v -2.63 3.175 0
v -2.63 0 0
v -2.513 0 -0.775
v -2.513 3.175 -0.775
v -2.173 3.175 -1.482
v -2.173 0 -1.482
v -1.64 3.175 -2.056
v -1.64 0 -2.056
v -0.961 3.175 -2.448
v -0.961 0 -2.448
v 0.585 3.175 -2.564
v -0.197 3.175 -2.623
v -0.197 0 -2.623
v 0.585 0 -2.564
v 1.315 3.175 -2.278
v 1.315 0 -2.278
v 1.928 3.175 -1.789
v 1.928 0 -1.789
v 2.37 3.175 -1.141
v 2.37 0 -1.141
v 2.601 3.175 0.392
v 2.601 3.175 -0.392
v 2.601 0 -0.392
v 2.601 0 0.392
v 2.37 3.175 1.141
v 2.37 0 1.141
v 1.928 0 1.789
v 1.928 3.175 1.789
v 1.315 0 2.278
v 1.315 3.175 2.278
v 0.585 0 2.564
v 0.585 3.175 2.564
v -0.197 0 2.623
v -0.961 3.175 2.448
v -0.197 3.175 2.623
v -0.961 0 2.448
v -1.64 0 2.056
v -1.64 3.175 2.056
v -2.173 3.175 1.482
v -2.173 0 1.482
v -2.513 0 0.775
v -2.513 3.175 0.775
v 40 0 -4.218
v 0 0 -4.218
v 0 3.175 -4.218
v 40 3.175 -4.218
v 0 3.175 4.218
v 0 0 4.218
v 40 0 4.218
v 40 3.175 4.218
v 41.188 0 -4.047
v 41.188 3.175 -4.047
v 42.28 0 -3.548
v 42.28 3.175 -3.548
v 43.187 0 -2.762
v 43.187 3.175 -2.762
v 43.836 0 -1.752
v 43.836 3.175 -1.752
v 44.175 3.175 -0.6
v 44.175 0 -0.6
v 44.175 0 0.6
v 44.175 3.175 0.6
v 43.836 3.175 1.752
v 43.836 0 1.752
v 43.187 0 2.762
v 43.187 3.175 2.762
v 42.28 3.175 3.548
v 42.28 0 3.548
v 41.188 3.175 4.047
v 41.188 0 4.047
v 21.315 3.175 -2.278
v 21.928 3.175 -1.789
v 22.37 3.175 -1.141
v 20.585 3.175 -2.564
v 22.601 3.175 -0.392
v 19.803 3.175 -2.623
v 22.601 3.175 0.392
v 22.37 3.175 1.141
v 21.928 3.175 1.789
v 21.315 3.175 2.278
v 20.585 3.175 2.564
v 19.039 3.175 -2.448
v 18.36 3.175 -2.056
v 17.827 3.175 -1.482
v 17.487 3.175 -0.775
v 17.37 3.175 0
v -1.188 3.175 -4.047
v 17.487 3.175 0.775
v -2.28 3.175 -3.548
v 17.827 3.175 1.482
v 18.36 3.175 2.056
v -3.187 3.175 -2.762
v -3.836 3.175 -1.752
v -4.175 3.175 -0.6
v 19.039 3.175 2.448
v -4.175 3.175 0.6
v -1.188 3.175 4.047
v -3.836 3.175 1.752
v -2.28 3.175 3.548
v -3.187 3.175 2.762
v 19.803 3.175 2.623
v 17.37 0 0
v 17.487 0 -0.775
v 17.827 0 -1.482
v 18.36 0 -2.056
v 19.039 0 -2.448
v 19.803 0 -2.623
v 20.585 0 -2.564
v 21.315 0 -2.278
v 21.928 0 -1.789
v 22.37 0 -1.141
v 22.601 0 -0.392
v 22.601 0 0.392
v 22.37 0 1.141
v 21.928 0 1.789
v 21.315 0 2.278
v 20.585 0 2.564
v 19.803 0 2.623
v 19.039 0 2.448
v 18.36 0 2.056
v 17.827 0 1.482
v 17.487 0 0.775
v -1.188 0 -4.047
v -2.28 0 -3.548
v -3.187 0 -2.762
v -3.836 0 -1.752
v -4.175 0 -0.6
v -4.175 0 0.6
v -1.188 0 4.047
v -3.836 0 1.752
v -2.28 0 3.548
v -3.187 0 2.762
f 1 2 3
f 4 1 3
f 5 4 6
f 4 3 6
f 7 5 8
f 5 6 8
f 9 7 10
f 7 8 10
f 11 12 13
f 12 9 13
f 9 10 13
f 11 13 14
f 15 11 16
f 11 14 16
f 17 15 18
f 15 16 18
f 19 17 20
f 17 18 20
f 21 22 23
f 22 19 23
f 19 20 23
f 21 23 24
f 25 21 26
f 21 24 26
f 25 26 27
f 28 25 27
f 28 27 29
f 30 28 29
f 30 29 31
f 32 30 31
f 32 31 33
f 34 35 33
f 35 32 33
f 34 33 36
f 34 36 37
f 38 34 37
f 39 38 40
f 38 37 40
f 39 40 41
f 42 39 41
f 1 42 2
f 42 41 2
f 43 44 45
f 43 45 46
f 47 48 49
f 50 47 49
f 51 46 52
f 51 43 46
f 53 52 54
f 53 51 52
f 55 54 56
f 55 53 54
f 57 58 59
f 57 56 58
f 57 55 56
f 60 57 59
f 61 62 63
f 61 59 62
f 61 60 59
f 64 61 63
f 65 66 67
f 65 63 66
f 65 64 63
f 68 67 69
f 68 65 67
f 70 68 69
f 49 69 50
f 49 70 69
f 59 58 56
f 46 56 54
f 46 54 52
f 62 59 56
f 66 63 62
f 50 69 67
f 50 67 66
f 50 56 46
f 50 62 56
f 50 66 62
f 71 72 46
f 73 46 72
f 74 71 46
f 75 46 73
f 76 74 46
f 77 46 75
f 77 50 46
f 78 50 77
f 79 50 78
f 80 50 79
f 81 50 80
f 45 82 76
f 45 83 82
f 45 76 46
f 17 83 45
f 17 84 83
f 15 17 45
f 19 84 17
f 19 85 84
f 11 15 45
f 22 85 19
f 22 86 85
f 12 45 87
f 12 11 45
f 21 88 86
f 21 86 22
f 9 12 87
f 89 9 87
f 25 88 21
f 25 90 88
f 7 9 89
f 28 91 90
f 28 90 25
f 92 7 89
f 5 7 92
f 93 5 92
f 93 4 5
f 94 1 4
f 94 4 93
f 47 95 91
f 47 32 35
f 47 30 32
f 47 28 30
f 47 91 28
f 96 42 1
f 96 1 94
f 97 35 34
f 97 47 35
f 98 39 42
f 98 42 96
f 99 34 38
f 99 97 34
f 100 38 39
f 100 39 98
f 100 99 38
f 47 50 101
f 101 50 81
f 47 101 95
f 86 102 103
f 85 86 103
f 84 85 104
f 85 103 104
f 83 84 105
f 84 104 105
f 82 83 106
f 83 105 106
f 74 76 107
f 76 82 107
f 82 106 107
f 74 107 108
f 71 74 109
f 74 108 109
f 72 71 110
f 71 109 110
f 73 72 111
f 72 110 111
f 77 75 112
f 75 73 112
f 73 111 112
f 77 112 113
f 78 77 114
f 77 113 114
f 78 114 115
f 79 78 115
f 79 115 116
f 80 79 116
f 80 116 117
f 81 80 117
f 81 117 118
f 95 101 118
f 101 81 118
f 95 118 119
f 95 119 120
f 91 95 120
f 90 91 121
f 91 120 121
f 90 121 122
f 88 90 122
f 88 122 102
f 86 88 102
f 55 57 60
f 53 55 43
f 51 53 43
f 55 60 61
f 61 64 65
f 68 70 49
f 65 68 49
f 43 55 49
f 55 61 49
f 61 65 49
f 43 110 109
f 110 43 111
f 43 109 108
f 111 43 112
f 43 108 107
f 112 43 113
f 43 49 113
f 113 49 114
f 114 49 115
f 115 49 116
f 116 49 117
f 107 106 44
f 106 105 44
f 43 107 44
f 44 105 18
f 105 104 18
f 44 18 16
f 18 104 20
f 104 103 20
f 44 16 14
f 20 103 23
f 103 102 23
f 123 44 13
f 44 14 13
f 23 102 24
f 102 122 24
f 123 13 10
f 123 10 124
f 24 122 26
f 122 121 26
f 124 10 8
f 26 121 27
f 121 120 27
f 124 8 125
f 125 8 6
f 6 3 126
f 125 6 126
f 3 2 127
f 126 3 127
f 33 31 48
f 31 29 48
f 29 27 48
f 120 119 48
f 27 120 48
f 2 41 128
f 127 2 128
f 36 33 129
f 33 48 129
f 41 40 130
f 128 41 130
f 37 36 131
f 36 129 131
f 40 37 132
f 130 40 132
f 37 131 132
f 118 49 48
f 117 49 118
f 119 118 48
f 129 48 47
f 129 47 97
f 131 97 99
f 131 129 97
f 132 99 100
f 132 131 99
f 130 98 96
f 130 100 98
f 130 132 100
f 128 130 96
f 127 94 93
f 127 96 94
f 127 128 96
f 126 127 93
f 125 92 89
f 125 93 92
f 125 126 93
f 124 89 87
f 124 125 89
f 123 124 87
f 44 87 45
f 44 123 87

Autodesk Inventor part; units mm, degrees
ref_plane "YZ Plane" through (0, 0, 0) normal (1, 0, 0) x (0, 1, 0)
ref_plane "XZ Plane" through (0, 0, 0) normal (0, 1, 0) x (-1, 0, 0)
ref_plane "XY Plane" through (0, 0, 0) normal (0, 0, 1) x (1, 0, 0)
sketch "Sketch1" plane through (0, 0, 0) normal (0, 1, 0) x (-1, 0, 0)
  circle A0 centre (0, 0) radius 2.63
  line L0 (0, 0) -> (-2.63, 0) construction
  circle A1 centre (-20, 0) radius 2.63
  circle A2 centre (0, 0) radius 4.2175 construction
  circle A3 centre (-20, 0) radius 4.2175 construction
  line L1 (0, 4.2175) -> (-40, 4.2175)
  line L2 (0, -4.2175) -> (-40, -4.2175)
  arc A4 (-40, 4.2175) -> (-40, -4.2175) centre (-40, 0) ccw
  arc A5 (0, -4.2175) -> (0, 4.2175) centre (0, 0) ccw
  dimension "d0" = 5.26
  dimension "d1" = 20
  dimension "d2" = 1.5875
  dimension "d3" = 20
extrude "Extrusion1" add sketch "Sketch1" along normal blind 3.175
properties part number "CNC-011-XAxisHardStop" material "Aluminum 6061"
